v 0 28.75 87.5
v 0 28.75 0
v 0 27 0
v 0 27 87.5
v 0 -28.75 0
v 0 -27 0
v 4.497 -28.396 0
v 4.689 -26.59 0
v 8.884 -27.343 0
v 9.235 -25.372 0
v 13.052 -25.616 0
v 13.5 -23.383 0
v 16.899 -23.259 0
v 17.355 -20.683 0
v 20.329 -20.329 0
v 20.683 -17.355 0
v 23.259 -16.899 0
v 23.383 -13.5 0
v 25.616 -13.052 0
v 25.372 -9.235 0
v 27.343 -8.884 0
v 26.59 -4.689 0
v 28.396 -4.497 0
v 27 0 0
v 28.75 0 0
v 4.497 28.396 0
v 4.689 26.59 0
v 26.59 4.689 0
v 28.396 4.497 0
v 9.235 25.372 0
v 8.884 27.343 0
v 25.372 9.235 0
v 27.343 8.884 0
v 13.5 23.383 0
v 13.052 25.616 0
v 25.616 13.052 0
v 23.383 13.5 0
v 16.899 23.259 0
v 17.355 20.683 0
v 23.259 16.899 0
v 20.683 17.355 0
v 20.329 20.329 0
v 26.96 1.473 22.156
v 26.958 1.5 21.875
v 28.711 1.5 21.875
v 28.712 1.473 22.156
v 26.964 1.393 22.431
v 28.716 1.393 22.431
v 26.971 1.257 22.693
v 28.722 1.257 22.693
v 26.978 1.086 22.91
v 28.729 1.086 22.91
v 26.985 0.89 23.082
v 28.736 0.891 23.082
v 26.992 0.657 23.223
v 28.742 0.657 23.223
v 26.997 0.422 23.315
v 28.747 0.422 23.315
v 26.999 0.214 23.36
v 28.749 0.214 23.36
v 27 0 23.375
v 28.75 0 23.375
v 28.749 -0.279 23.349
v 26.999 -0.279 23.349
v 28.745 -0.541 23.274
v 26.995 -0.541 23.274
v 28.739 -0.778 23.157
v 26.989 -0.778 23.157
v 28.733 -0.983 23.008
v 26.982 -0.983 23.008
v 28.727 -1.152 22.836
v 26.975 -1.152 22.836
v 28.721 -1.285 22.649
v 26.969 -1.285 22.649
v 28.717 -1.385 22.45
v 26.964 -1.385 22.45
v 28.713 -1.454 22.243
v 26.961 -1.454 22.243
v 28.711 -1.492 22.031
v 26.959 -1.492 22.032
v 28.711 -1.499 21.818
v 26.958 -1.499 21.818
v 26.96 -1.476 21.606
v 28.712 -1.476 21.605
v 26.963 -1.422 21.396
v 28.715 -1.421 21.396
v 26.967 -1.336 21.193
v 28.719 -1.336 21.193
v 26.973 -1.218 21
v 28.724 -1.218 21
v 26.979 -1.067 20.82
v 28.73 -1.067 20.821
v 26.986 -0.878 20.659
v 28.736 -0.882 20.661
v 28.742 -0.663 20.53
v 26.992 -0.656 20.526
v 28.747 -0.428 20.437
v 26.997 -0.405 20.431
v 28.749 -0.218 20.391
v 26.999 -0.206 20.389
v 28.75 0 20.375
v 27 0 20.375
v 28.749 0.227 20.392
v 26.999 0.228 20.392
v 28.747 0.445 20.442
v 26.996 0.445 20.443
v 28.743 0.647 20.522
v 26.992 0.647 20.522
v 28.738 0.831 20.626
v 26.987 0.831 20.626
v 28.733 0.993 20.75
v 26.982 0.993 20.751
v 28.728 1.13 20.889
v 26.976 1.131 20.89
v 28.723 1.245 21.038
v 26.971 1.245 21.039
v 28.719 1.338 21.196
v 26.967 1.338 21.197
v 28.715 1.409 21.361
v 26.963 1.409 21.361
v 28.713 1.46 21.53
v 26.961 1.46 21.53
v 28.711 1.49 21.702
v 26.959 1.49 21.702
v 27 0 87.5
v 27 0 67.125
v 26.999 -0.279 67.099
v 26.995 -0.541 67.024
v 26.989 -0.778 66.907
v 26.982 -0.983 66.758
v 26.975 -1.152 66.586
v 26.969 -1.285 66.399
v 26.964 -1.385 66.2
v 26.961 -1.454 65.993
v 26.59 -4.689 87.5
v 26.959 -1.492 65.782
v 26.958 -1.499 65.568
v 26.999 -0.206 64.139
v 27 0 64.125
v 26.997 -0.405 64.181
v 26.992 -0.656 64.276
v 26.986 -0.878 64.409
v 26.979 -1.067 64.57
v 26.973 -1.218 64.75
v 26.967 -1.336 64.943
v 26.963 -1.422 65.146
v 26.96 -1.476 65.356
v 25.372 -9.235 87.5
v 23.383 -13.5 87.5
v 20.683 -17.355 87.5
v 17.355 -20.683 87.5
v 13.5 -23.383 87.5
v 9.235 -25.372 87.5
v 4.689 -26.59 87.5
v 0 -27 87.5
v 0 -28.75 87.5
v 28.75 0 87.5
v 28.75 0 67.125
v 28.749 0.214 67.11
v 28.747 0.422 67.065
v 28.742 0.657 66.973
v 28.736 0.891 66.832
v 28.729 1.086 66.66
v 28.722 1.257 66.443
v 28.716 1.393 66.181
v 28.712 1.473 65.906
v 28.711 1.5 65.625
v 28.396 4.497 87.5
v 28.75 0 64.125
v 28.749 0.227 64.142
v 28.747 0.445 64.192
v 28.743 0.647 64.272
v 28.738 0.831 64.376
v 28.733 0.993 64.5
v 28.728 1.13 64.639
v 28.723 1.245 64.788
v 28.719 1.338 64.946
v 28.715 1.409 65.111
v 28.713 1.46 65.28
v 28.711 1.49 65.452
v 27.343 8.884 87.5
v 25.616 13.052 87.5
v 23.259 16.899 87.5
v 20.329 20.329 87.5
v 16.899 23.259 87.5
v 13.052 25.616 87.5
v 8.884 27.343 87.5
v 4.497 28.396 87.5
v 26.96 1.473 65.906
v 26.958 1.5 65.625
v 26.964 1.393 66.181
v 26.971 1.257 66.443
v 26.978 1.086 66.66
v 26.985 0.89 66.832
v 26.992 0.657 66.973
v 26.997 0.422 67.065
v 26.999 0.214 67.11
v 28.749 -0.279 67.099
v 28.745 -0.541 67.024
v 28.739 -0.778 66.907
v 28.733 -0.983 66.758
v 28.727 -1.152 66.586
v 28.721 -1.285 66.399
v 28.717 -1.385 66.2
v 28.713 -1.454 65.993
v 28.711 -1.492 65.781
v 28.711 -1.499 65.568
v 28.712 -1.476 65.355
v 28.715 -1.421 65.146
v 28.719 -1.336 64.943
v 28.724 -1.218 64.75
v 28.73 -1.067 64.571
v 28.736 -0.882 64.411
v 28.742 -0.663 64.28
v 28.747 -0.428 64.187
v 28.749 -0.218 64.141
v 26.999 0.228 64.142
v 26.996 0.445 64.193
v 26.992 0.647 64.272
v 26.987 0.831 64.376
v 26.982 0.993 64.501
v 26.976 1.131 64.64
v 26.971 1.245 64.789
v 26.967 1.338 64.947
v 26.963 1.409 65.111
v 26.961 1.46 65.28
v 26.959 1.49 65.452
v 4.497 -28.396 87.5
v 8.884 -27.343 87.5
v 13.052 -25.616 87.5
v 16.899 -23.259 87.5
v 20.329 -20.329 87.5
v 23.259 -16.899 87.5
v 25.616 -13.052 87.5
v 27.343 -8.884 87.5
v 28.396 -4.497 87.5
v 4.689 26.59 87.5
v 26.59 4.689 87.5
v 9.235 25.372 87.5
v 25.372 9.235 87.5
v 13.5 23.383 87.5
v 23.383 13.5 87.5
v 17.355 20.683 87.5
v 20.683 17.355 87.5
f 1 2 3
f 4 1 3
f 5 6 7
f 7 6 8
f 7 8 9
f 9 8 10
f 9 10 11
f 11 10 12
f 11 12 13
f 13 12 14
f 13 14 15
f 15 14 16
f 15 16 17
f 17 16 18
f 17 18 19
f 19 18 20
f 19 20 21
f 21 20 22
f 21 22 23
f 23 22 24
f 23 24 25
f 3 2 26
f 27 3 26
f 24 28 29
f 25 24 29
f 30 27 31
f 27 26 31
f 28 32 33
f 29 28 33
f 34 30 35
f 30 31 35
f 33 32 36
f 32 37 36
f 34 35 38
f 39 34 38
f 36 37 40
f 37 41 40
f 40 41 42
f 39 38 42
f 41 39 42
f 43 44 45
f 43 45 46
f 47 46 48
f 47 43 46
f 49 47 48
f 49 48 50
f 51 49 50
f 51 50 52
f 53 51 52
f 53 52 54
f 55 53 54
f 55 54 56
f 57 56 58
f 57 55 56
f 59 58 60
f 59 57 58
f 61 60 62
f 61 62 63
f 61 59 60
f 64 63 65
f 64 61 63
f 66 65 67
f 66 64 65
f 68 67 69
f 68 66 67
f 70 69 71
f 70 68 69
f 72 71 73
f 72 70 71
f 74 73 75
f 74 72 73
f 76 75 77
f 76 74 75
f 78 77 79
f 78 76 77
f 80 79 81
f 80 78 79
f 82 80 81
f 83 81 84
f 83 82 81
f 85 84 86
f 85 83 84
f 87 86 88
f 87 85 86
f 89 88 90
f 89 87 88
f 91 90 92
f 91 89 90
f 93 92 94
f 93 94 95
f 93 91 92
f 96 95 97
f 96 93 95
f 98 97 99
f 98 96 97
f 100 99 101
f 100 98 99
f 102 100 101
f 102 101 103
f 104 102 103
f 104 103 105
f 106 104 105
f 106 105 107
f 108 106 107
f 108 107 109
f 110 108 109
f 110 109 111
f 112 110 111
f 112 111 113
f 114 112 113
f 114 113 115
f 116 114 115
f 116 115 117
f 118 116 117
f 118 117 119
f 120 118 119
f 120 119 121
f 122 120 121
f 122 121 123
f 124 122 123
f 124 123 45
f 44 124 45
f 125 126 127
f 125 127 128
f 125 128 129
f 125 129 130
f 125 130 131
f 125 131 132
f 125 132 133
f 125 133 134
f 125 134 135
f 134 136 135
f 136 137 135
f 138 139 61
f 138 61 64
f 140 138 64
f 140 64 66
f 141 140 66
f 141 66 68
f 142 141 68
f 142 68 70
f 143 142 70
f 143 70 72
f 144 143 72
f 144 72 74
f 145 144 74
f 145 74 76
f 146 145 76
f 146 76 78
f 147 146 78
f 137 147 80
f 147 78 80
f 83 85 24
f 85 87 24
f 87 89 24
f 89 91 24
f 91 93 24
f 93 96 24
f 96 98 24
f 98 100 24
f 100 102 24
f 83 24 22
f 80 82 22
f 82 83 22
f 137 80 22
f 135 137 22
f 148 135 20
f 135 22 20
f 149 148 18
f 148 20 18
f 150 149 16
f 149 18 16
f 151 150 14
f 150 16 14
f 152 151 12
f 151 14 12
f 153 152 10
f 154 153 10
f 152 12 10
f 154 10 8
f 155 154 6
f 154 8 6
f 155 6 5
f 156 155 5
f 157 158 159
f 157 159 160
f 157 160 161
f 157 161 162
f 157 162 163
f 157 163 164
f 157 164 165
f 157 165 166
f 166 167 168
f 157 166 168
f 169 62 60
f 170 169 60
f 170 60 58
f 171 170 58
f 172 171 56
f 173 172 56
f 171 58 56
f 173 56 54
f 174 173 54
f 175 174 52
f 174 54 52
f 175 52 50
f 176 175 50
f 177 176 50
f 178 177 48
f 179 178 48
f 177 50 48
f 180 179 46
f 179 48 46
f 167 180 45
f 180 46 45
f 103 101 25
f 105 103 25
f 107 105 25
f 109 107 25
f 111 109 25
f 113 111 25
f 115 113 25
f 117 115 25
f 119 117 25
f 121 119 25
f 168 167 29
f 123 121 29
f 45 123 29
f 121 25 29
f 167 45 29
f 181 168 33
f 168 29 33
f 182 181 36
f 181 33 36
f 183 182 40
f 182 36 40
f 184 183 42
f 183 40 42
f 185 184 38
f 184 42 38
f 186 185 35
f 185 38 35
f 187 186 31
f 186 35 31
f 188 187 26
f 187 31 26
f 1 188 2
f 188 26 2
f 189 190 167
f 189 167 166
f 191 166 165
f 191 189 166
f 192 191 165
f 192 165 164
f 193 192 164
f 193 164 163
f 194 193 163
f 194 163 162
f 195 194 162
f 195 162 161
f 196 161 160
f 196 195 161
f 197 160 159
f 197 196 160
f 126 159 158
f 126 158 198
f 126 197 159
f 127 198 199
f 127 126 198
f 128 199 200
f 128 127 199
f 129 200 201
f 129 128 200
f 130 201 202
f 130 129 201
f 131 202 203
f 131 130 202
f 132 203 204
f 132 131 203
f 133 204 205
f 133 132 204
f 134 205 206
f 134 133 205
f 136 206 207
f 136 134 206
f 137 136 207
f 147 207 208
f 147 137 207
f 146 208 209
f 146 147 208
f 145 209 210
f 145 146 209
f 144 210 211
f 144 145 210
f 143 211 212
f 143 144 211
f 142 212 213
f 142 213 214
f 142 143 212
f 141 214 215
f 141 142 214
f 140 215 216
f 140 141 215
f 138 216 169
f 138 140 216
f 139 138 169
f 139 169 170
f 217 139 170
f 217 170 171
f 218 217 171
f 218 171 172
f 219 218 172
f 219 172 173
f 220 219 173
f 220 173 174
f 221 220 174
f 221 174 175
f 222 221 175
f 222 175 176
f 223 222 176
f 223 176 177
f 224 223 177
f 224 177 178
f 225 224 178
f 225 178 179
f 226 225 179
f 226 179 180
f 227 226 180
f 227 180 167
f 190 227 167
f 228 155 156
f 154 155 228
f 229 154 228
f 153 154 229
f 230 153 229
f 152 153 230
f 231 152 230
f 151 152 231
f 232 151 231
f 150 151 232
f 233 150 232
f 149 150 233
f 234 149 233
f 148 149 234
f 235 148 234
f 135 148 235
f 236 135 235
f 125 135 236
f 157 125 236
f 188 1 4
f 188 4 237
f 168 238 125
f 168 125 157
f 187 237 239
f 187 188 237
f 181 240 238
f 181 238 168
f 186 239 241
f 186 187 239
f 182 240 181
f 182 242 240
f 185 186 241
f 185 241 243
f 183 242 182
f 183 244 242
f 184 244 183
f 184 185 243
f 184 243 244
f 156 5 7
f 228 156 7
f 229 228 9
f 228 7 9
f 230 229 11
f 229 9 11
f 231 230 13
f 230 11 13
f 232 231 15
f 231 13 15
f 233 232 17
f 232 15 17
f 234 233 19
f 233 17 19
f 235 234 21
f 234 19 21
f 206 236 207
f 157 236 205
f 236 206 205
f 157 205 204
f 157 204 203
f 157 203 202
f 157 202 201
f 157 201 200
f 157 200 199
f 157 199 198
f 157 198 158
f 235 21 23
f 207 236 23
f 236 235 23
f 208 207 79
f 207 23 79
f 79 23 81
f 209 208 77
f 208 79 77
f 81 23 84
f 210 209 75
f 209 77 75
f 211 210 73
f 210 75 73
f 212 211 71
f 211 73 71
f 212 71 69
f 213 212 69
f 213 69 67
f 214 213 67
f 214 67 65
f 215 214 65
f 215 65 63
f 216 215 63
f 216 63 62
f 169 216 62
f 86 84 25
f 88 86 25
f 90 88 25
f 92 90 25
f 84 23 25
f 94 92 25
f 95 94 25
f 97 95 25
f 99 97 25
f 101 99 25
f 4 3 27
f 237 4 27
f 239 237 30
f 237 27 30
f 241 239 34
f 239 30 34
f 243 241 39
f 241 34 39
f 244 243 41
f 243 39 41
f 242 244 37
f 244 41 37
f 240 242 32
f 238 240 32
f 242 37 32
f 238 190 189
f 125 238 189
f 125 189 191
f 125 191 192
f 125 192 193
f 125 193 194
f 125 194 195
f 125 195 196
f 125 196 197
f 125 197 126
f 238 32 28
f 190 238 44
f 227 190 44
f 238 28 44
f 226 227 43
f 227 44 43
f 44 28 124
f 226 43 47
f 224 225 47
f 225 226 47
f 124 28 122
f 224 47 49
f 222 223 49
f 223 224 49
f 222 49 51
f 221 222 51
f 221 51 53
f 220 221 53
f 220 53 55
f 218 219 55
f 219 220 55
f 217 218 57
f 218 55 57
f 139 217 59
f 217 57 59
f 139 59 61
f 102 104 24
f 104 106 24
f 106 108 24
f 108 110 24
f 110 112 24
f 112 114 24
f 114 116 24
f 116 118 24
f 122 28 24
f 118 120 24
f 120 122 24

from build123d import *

# Parameters (mm, degrees)
F1_DEPTH = 87.5
F3_R     = 1.5
F4_DEPTH = 28.751


with BuildPart() as f1:
    # F0 (on Top) → F1 (new body)
    with BuildSketch(Plane.XY):
        with BuildLine():
            ThreePointArc((0, -28.75), (20.3293199591, -20.3293199591), (28.75, 0))
            ThreePointArc((28.75, 0), (20.3293199591, 20.3293199591), (0, 28.75))
            Line((0, 28.75), (0, 27))
            ThreePointArc((0, 27), (19.091883092, 19.091883092), (27, 0))
            ThreePointArc((27, 0), (19.091883092, -19.091883092), (0, -27))
            Line((0, -27), (0, -28.75))
        make_face()
    extrude(amount=F1_DEPTH)

    # F3 (on Right) → F4 (cut, through all)
    with BuildSketch(Plane.YZ):
        with Locations((0, 65.625)):
            Circle(F3_R)
        with Locations((0, 21.875)):
            Circle(F3_R)
    extrude(amount=F4_DEPTH, mode=Mode.SUBTRACT)


solid = f1.part
